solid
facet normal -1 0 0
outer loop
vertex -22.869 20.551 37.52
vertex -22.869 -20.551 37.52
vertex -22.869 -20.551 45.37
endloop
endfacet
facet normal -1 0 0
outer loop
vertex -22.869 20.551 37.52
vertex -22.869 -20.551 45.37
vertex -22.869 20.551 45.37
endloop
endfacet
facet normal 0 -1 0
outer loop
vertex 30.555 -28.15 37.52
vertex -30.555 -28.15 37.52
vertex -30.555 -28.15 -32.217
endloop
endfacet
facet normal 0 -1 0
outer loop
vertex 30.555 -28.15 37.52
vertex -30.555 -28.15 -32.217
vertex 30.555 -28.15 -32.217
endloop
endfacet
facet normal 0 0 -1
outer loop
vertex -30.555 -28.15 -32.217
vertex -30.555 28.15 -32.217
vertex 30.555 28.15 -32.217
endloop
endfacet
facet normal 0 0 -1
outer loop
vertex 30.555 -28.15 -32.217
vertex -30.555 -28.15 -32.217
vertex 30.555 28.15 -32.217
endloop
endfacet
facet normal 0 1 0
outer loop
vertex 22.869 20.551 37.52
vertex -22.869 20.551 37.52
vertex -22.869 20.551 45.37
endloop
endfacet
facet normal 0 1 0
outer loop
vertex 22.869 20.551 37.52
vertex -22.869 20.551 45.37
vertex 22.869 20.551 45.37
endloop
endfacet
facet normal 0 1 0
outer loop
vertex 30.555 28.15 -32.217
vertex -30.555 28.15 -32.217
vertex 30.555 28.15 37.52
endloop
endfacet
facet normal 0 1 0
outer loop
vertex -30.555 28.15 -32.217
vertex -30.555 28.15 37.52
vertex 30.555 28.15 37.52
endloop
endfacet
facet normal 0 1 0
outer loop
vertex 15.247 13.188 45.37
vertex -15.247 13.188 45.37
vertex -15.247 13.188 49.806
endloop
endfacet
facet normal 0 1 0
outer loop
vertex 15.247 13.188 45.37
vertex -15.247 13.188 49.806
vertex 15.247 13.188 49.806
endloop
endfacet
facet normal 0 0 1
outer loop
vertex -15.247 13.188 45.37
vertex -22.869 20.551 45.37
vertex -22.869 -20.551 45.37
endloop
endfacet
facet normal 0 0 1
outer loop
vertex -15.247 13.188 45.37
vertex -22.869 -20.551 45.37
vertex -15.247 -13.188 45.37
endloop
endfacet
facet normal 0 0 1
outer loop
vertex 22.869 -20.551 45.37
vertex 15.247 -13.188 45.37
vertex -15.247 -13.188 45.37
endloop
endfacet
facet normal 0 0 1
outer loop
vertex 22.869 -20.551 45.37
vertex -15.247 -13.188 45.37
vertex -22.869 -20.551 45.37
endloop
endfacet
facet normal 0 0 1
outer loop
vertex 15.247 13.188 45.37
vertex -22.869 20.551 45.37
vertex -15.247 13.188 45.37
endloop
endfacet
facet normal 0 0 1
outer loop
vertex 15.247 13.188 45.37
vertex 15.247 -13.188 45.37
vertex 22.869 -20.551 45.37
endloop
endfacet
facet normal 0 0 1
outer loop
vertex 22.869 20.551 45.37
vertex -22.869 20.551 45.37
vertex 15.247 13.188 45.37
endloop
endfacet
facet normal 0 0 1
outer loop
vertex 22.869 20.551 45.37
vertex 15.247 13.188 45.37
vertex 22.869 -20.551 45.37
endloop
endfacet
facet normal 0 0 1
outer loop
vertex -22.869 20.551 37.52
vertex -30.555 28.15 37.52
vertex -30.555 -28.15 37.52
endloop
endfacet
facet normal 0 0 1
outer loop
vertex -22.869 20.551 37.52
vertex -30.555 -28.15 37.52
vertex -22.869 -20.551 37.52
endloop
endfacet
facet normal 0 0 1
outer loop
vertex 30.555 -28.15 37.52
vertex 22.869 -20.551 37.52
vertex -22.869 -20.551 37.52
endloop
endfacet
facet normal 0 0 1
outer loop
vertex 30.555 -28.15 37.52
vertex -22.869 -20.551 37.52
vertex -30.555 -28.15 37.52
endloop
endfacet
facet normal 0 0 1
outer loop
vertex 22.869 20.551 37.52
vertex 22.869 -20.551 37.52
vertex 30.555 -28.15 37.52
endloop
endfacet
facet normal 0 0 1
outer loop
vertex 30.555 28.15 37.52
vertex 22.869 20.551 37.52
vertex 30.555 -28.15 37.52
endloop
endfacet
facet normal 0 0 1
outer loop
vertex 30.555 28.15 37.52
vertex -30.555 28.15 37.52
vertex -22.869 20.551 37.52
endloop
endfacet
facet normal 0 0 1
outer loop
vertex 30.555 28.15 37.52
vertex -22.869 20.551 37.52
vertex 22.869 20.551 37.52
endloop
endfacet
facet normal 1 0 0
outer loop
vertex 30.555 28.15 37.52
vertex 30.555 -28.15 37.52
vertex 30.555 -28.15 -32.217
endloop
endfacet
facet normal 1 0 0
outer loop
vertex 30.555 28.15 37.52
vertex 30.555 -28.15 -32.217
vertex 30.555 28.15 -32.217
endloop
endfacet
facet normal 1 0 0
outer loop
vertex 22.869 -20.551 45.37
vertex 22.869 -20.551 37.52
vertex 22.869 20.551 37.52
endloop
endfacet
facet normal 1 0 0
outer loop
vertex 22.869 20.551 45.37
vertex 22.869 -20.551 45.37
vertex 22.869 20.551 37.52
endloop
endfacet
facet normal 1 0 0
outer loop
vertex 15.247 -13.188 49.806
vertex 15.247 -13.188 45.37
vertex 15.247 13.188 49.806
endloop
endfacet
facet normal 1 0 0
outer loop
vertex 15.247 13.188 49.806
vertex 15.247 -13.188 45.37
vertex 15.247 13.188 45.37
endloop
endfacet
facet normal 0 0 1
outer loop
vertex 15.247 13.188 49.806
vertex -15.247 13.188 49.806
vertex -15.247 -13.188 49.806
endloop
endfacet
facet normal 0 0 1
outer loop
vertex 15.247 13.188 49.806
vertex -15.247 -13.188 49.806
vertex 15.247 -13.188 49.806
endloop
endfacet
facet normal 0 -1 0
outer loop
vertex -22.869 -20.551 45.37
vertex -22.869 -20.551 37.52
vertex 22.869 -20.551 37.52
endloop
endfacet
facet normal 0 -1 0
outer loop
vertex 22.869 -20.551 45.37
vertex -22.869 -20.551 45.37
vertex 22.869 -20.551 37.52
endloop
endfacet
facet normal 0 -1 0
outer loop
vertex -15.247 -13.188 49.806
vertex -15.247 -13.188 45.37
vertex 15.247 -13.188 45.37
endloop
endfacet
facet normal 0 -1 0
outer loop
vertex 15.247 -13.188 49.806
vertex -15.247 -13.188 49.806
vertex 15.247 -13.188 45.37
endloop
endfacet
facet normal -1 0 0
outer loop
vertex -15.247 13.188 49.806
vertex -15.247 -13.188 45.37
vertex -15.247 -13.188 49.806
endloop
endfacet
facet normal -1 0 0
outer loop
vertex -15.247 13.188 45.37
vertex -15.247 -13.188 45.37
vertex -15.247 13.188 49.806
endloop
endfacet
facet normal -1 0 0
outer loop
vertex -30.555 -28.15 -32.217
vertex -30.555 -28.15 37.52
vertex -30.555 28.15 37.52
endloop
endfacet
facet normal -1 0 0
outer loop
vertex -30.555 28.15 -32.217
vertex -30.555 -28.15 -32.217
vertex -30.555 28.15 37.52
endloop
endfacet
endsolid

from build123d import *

# Parameters (mm, degrees)
F0_W          = 61.110928
F0_H          = 56.300208
F1_DEPTH      = 37.51986
F1_DEPTH_BACK = 32.21742
F2_W          = 45.738346
F2_H          = 41.101918
F3_DEPTH      = 7.84984
F4_W          = 30.494862
F4_H          = 26.376776
F5_DEPTH      = 4.4368


with BuildPart() as f1:
    # F0 (on Top) → F1 (new body, two sides)
    with BuildSketch(Plane.XY) as f1_sk:
        Rectangle(F0_W, F0_H)
    extrude(amount=F1_DEPTH)
    extrude(f1_sk.sketch, amount=-F1_DEPTH_BACK)

    # F2 (on face) → F3 (join)
    with BuildSketch(Plane.XY.offset(37.51986)):
        Rectangle(F2_W, F2_H)
    extrude(amount=F3_DEPTH)

    # F4 (on face) → F5 (join)
    with BuildSketch(Plane.XY.offset(45.3697)):
        Rectangle(F4_W, F4_H)
    extrude(amount=F5_DEPTH)


solid = f1.part
